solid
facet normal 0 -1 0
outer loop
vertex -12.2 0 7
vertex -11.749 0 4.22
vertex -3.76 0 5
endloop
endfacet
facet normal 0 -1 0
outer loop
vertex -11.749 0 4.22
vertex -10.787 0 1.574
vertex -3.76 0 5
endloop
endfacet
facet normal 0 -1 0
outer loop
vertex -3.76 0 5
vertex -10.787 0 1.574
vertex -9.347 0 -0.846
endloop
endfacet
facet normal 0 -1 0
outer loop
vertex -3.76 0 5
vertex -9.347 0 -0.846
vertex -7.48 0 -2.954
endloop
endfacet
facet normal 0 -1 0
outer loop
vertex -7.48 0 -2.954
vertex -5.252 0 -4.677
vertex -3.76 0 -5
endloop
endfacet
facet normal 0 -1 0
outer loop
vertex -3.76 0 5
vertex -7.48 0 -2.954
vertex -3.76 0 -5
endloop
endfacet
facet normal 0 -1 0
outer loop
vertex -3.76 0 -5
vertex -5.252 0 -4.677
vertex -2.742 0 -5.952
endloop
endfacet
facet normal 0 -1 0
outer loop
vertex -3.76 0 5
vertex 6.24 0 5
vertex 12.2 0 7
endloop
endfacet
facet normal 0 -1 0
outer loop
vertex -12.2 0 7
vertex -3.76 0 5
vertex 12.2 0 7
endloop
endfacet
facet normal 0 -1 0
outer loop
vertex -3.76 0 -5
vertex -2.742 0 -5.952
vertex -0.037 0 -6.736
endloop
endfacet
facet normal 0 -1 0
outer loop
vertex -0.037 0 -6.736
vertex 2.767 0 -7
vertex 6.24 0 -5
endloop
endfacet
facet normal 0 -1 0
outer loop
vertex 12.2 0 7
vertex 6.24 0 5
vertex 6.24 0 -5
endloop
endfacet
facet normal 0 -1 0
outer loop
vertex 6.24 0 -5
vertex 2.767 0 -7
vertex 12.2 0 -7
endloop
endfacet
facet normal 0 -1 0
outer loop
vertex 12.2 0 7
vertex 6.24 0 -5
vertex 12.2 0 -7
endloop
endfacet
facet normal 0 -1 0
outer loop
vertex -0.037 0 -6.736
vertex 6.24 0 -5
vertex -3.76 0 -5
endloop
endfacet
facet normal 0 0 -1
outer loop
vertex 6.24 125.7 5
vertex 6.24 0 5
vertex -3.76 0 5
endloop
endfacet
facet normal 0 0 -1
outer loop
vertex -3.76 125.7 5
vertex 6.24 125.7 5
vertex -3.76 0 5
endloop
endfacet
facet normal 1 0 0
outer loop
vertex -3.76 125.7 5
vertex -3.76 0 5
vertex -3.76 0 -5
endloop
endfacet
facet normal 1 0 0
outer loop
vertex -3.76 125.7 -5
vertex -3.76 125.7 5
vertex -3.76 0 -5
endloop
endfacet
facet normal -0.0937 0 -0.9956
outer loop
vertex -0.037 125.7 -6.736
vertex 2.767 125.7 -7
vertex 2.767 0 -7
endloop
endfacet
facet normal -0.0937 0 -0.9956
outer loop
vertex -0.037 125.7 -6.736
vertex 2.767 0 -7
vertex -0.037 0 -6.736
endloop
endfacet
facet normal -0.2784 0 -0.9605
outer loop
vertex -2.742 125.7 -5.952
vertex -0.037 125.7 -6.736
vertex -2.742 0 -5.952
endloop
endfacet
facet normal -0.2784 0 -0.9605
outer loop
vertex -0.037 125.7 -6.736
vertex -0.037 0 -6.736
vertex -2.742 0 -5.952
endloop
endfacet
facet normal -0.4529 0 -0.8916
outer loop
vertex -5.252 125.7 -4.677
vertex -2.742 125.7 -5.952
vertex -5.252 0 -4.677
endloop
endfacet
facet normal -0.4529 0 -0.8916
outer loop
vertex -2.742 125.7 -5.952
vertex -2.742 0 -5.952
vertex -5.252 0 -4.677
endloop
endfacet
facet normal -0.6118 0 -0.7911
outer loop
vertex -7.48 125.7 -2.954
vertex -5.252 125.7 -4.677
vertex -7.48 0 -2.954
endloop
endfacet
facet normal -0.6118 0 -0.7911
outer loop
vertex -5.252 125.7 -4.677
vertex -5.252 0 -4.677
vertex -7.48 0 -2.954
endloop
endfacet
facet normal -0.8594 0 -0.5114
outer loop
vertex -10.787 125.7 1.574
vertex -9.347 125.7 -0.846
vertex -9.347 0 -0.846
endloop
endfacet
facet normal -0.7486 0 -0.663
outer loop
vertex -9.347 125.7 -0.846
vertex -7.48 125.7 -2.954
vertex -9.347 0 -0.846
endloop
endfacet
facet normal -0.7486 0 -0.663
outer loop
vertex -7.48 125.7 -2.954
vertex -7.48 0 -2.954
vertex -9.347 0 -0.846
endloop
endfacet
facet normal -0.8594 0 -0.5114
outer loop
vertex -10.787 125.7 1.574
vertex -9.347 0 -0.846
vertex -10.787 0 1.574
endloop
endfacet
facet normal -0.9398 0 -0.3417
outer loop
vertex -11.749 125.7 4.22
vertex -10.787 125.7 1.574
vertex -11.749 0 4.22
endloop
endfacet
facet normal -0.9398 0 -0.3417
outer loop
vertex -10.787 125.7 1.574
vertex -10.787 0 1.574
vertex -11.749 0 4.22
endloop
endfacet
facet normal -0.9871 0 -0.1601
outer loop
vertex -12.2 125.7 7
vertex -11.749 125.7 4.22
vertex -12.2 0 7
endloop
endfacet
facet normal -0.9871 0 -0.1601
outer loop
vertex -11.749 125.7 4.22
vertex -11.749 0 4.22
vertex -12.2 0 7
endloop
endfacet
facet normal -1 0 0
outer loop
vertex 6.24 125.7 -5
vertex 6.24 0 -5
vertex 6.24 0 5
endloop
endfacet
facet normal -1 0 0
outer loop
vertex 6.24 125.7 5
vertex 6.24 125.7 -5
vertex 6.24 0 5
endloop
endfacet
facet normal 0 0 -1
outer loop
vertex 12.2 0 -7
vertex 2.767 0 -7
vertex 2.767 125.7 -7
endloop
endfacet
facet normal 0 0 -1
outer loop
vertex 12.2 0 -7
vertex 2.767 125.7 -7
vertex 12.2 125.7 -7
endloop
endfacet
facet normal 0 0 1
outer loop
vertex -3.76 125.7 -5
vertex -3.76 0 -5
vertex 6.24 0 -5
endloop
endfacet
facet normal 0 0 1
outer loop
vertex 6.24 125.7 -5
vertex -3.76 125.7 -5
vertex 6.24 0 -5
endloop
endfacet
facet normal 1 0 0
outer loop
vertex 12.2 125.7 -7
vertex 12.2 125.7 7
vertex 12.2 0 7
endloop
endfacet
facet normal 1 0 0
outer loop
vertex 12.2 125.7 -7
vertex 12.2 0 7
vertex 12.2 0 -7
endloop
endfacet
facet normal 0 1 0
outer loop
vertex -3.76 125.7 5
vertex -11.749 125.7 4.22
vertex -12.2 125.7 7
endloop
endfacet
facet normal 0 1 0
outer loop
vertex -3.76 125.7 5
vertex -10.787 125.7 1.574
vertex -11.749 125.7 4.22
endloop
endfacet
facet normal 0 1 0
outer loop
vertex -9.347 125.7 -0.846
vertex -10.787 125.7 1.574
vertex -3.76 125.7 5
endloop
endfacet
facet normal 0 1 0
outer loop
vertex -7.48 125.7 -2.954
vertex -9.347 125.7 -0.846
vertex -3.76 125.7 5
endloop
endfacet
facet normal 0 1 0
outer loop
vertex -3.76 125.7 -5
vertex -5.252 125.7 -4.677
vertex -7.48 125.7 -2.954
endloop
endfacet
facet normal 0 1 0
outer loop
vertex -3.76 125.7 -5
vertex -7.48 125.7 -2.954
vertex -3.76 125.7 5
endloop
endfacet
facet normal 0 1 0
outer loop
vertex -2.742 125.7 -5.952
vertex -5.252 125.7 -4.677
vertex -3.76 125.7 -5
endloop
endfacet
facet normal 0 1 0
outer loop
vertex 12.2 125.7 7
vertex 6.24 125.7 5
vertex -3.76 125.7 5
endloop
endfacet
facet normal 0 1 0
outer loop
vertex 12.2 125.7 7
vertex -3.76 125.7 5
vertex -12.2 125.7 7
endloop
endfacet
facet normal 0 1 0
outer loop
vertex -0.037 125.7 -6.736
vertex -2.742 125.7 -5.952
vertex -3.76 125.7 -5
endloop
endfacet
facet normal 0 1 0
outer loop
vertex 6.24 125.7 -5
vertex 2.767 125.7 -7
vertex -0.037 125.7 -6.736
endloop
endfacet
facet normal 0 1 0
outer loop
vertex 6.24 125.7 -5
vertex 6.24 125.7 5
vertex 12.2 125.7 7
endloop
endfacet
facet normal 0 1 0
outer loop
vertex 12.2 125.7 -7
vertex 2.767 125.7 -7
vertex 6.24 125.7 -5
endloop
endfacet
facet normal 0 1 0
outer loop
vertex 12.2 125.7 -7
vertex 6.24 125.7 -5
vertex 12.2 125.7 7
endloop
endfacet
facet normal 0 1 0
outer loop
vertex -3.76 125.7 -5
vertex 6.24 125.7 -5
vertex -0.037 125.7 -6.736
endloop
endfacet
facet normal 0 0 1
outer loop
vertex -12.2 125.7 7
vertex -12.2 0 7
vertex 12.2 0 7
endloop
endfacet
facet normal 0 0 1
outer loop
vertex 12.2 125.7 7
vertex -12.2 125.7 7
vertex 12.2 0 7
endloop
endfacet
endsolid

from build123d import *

# Parameters (mm, degrees)
SKETCH_1_W          = 24.4
SKETCH_1_H          = 14
EXTRUDE_1_DEPTH     = 125.7
CUT_EXTRUDE_1_DEPTH = 125.7
FILLET_1_R          = 15


with BuildPart() as part:
    # Эскиз1 → Бобышка-Вытянуть1 (new body)
    with BuildSketch(Plane(origin=(0, 0, 0), x_dir=(1, 0, 0), z_dir=(0, 1, 0))):
        Rectangle(SKETCH_1_W, SKETCH_1_H)
    extrude(amount=EXTRUDE_1_DEPTH)

    # Эскиз5 → Вырез-Вытянуть1 (cut)
    with BuildSketch(Plane(origin=(0, 0, 0), x_dir=(-1, 0, 0), z_dir=(0, -1, 0))):
        Polygon((-1.24, 0), (-1.24, -5), (3.76, -5), (3.76, 5), (-1.234412321, 5), (0, 0), align=None)
        Polygon((-6.24, -5), (-1.24, -5), (-1.24, 0), (-1.24, 5), (-6.24, 5), align=None)
        Polygon((-1.24, 5), (-1.24, 0), (0, 0), (-1.234412321, 5), align=None)
    extrude(amount=-CUT_EXTRUDE_1_DEPTH, mode=Mode.SUBTRACT)

    # Скругление1
    # the kernel refuses this fillet: 15 mm, written as the material it takes off along each edge
    with BuildSketch(Plane(origin=(-12.2, -37.416573868, -7), x_dir=(1, 0, 0), z_dir=(0, 1, 0))) as fillet_1_piece_1:
        with BuildLine():
            CenterArc((14.966629547, -15), FILLET_1_R, 90, 86.177446271)
            Line((0, -14), (-0.299332591, -13.98))
            ThreePointArc((-0.299332591, -13.98), (-0.3, -7), (-0.3, 0))
            Line((-0.3, 0), (0, 0.3))
            Line((0, 0.3), (14.966629547, 0.3))
            Line((14.966629547, 0.3), (14.966629547, 0))
        make_face()
    extrude(amount=200.533147735, mode=Mode.SUBTRACT)


solid = part.part
